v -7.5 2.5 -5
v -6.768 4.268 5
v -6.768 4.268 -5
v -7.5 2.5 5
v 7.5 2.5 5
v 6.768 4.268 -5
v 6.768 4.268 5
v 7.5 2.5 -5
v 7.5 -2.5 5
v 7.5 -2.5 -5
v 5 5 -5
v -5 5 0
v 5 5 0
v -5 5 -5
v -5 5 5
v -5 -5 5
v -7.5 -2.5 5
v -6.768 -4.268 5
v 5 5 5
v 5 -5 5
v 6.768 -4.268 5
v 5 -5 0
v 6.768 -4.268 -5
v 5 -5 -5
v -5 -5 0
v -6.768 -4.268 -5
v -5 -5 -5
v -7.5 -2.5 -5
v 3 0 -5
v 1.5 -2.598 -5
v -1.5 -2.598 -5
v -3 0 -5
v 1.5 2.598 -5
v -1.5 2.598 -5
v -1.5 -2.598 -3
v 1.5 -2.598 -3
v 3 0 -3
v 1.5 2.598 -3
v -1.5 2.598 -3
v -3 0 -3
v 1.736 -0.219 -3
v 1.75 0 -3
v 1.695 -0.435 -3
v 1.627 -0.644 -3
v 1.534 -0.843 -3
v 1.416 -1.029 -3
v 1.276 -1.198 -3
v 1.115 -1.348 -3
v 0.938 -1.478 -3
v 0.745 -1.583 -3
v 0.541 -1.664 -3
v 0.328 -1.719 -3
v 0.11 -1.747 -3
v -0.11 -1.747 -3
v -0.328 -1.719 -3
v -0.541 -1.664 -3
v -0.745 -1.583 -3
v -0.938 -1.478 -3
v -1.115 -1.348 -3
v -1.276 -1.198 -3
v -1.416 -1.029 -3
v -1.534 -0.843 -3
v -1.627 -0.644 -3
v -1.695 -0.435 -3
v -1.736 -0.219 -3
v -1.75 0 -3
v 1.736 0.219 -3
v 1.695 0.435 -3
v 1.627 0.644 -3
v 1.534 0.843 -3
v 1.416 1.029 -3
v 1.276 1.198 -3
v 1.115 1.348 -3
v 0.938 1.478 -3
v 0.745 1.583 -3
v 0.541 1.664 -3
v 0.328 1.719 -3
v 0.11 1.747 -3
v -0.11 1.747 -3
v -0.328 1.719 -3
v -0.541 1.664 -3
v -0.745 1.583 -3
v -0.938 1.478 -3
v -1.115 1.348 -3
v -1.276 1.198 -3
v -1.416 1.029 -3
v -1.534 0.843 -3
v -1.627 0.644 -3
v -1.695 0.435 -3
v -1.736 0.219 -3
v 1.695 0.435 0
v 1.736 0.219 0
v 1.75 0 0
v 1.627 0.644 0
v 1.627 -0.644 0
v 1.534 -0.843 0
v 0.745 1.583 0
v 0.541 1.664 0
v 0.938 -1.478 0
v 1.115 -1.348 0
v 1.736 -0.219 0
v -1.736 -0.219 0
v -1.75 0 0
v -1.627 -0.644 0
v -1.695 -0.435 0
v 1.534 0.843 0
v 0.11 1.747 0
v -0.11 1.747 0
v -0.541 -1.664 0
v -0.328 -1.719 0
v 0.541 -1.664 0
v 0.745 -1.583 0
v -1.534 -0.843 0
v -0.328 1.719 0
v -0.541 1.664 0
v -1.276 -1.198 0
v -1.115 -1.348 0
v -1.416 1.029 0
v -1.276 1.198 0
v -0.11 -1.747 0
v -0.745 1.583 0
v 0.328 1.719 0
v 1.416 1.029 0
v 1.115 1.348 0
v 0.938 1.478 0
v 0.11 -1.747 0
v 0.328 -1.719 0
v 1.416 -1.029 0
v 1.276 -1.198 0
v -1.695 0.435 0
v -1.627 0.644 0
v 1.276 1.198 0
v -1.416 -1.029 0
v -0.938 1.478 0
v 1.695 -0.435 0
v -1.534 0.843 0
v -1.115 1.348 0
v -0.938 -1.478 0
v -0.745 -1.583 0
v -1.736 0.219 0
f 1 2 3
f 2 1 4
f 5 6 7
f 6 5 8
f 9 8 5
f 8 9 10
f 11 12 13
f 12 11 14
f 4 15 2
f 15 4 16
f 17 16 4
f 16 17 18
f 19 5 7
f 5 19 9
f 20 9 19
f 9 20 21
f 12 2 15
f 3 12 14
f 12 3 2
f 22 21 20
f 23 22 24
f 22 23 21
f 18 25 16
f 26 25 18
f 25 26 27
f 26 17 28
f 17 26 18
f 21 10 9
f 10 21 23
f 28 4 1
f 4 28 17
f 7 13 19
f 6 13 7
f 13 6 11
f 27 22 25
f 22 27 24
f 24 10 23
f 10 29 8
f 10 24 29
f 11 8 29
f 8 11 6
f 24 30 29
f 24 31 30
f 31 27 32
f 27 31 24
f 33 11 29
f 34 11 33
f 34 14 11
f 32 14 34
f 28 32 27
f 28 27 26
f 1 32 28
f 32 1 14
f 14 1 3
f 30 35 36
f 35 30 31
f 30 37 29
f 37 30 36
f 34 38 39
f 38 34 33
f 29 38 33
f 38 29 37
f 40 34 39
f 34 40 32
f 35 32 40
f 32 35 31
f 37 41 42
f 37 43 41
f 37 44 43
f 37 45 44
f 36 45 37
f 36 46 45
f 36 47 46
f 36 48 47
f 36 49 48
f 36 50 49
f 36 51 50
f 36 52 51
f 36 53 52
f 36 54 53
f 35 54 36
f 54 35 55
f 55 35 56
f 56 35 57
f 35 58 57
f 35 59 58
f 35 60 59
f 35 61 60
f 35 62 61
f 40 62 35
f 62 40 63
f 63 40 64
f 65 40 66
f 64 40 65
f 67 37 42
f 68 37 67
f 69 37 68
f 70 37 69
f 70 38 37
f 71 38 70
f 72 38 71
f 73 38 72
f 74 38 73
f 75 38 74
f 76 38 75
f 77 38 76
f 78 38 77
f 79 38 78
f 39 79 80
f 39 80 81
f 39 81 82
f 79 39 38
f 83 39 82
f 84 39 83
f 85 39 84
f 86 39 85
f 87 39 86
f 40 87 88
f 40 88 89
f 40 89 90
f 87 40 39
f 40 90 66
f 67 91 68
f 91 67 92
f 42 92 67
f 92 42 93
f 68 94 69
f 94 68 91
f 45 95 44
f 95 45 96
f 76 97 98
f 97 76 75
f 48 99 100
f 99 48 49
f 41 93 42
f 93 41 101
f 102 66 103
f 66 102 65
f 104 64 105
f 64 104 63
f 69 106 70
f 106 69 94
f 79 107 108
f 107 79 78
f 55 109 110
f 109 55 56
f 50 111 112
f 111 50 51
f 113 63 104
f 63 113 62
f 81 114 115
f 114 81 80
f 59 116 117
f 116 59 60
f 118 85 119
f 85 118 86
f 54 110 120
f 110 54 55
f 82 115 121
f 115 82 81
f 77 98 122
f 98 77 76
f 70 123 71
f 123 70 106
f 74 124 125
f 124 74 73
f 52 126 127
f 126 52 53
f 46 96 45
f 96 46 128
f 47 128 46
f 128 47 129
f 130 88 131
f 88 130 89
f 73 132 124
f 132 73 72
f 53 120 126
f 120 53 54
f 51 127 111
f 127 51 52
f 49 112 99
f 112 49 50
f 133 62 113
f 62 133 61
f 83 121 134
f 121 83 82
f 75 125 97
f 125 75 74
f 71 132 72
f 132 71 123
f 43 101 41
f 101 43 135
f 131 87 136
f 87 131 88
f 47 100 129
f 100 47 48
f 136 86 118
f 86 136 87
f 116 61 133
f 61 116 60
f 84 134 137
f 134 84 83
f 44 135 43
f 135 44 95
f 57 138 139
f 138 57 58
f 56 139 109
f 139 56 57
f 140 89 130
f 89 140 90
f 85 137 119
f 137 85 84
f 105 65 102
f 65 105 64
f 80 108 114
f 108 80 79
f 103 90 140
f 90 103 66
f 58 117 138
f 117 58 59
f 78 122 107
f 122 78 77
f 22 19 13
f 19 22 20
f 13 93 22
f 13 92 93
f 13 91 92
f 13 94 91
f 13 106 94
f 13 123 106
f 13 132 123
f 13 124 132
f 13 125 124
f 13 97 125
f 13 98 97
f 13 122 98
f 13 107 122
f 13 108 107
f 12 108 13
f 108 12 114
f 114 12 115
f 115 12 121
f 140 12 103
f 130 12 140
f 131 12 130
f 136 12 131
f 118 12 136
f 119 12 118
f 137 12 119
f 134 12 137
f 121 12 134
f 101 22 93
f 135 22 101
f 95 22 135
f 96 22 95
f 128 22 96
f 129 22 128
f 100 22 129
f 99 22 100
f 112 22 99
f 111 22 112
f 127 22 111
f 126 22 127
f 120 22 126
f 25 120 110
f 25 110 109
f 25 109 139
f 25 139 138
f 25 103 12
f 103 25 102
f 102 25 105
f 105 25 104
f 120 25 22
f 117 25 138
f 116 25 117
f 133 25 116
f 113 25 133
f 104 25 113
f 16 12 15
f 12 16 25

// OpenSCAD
wd=10;
offsetx=0;
offsety=0;

difference()
{
    minkowski(){
    cube([wd,5,5.],center=true);
    cylinder(d=5,h=5,center=true);
    }
    translate([offsetx,offsety,-5]) color([0.1,0.4,0.4]) cylinder(r=3,h=4,$fn=6,center=true);
    translate([offsetx,offsety,-5]) color([0.1,0.4,0.4]) cylinder(d=3.5,h=15,$fn=50,center=true);
    translate([0,0,5]) color([0.4,0.1,0.9]) cube([wd,30,10],center=true);
}
